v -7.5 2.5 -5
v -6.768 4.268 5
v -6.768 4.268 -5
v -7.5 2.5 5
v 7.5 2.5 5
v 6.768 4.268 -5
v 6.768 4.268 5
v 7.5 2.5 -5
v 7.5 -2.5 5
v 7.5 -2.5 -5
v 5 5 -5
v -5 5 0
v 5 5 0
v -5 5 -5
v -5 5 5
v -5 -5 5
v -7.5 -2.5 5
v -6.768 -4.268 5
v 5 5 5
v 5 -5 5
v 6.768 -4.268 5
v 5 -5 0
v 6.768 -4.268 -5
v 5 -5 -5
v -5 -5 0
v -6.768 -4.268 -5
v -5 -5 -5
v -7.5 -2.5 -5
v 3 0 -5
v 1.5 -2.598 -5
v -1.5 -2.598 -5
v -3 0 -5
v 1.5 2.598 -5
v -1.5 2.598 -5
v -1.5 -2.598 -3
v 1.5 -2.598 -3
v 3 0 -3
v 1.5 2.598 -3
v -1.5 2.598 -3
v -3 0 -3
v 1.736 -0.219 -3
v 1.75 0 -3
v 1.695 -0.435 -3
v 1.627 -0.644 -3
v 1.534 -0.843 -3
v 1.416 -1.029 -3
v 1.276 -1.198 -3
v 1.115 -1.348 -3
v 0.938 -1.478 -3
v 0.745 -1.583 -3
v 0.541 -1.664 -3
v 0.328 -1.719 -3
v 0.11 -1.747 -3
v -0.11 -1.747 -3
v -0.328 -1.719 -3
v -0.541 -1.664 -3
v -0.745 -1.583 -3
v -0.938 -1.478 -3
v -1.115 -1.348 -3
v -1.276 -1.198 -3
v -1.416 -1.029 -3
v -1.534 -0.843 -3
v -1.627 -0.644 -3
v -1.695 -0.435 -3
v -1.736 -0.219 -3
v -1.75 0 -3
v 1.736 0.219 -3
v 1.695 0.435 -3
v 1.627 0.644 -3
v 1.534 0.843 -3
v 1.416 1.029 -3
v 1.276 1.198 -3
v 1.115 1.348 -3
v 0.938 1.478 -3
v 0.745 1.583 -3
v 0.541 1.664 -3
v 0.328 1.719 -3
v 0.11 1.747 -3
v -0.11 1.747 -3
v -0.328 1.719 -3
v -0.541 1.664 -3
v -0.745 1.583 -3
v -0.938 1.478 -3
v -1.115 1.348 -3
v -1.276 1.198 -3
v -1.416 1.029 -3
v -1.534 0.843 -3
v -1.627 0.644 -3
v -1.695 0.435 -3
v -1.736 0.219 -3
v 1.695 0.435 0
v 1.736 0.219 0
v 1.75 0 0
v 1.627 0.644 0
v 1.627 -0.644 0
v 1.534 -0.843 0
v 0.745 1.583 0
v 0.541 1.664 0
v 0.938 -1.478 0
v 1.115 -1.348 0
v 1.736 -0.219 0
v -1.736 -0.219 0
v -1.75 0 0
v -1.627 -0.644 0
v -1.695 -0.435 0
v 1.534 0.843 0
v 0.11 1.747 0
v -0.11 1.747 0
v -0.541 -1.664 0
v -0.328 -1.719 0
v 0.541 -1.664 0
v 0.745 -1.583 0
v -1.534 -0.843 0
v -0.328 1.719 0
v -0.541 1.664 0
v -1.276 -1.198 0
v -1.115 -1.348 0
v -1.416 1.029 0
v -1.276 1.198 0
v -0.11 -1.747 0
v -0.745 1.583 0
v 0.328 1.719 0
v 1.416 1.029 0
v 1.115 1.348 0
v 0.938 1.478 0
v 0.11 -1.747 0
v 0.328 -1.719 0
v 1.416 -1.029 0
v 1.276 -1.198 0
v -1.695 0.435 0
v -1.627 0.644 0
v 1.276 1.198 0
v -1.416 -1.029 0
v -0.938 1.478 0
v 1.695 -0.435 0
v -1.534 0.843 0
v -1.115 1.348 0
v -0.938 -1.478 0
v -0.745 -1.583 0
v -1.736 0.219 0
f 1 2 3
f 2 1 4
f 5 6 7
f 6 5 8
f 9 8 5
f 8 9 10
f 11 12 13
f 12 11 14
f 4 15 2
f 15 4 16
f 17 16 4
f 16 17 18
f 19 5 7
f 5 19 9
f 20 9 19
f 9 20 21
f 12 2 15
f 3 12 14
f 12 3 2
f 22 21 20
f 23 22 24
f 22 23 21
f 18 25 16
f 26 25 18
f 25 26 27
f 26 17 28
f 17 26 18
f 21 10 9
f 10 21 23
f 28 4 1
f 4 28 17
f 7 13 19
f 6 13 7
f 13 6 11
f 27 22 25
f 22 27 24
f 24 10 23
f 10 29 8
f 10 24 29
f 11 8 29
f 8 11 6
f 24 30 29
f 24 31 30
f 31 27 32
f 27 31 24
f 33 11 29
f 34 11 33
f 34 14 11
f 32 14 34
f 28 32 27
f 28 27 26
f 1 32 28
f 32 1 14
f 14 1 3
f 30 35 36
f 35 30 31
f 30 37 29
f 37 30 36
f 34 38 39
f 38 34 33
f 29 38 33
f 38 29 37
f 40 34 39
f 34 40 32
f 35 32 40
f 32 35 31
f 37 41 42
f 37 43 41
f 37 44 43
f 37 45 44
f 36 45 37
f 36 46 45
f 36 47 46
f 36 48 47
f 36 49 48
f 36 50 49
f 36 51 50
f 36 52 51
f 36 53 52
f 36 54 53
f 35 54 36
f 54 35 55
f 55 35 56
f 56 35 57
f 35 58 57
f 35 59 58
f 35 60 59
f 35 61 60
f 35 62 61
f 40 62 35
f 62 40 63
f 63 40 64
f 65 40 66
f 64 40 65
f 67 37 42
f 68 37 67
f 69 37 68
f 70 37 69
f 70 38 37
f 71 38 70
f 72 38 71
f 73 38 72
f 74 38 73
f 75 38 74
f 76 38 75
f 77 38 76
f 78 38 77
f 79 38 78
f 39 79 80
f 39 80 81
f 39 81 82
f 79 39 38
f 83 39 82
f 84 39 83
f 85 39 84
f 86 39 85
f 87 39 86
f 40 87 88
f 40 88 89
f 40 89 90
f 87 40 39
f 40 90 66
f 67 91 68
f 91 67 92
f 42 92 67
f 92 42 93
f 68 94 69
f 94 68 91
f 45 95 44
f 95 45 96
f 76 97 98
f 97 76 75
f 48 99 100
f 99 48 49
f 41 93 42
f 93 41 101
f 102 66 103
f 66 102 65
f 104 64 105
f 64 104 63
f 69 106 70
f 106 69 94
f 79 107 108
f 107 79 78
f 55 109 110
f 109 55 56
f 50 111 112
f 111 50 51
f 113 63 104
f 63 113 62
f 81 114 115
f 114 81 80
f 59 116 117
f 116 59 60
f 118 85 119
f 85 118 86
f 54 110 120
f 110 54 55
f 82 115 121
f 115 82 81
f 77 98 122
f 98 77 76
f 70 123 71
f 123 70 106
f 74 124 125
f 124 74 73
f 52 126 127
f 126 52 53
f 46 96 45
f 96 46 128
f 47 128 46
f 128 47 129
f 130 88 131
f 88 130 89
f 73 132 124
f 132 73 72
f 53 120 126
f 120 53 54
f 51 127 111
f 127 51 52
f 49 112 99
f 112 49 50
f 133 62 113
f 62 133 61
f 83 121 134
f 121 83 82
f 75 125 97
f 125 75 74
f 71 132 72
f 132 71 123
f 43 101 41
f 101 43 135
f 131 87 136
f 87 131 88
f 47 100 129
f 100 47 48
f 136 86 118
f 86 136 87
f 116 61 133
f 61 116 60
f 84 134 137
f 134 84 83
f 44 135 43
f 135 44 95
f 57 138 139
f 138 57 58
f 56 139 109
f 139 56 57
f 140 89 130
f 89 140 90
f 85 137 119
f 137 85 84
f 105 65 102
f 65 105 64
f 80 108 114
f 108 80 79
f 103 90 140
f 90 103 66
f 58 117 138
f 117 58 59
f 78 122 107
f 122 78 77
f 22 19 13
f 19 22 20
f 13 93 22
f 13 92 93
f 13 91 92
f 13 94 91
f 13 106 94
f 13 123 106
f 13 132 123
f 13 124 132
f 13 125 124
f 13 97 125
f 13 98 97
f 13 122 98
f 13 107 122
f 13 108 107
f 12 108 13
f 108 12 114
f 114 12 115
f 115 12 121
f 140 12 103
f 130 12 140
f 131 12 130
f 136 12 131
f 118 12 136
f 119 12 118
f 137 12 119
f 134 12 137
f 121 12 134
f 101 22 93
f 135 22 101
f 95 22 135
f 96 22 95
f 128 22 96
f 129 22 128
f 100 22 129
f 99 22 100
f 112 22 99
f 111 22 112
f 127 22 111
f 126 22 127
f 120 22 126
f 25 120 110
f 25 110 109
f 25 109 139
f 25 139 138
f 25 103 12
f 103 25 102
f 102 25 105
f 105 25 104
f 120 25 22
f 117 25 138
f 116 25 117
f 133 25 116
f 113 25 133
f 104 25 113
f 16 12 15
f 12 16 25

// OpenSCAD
wd=10;
offsetx=0;
offsety=0;

difference()
{
    minkowski(){
    cube([wd,5,5.],center=true);
    cylinder(d=5,h=5,center=true);
    }
    translate([offsetx,offsety,-5]) color([0.1,0.4,0.4]) cylinder(r=3,h=4,$fn=6,center=true);
    translate([offsetx,offsety,-5]) color([0.1,0.4,0.4]) cylinder(d=3.5,h=15,$fn=50,center=true);
    translate([0,0,5]) color([0.4,0.1,0.9]) cube([wd,30,10],center=true);
}
